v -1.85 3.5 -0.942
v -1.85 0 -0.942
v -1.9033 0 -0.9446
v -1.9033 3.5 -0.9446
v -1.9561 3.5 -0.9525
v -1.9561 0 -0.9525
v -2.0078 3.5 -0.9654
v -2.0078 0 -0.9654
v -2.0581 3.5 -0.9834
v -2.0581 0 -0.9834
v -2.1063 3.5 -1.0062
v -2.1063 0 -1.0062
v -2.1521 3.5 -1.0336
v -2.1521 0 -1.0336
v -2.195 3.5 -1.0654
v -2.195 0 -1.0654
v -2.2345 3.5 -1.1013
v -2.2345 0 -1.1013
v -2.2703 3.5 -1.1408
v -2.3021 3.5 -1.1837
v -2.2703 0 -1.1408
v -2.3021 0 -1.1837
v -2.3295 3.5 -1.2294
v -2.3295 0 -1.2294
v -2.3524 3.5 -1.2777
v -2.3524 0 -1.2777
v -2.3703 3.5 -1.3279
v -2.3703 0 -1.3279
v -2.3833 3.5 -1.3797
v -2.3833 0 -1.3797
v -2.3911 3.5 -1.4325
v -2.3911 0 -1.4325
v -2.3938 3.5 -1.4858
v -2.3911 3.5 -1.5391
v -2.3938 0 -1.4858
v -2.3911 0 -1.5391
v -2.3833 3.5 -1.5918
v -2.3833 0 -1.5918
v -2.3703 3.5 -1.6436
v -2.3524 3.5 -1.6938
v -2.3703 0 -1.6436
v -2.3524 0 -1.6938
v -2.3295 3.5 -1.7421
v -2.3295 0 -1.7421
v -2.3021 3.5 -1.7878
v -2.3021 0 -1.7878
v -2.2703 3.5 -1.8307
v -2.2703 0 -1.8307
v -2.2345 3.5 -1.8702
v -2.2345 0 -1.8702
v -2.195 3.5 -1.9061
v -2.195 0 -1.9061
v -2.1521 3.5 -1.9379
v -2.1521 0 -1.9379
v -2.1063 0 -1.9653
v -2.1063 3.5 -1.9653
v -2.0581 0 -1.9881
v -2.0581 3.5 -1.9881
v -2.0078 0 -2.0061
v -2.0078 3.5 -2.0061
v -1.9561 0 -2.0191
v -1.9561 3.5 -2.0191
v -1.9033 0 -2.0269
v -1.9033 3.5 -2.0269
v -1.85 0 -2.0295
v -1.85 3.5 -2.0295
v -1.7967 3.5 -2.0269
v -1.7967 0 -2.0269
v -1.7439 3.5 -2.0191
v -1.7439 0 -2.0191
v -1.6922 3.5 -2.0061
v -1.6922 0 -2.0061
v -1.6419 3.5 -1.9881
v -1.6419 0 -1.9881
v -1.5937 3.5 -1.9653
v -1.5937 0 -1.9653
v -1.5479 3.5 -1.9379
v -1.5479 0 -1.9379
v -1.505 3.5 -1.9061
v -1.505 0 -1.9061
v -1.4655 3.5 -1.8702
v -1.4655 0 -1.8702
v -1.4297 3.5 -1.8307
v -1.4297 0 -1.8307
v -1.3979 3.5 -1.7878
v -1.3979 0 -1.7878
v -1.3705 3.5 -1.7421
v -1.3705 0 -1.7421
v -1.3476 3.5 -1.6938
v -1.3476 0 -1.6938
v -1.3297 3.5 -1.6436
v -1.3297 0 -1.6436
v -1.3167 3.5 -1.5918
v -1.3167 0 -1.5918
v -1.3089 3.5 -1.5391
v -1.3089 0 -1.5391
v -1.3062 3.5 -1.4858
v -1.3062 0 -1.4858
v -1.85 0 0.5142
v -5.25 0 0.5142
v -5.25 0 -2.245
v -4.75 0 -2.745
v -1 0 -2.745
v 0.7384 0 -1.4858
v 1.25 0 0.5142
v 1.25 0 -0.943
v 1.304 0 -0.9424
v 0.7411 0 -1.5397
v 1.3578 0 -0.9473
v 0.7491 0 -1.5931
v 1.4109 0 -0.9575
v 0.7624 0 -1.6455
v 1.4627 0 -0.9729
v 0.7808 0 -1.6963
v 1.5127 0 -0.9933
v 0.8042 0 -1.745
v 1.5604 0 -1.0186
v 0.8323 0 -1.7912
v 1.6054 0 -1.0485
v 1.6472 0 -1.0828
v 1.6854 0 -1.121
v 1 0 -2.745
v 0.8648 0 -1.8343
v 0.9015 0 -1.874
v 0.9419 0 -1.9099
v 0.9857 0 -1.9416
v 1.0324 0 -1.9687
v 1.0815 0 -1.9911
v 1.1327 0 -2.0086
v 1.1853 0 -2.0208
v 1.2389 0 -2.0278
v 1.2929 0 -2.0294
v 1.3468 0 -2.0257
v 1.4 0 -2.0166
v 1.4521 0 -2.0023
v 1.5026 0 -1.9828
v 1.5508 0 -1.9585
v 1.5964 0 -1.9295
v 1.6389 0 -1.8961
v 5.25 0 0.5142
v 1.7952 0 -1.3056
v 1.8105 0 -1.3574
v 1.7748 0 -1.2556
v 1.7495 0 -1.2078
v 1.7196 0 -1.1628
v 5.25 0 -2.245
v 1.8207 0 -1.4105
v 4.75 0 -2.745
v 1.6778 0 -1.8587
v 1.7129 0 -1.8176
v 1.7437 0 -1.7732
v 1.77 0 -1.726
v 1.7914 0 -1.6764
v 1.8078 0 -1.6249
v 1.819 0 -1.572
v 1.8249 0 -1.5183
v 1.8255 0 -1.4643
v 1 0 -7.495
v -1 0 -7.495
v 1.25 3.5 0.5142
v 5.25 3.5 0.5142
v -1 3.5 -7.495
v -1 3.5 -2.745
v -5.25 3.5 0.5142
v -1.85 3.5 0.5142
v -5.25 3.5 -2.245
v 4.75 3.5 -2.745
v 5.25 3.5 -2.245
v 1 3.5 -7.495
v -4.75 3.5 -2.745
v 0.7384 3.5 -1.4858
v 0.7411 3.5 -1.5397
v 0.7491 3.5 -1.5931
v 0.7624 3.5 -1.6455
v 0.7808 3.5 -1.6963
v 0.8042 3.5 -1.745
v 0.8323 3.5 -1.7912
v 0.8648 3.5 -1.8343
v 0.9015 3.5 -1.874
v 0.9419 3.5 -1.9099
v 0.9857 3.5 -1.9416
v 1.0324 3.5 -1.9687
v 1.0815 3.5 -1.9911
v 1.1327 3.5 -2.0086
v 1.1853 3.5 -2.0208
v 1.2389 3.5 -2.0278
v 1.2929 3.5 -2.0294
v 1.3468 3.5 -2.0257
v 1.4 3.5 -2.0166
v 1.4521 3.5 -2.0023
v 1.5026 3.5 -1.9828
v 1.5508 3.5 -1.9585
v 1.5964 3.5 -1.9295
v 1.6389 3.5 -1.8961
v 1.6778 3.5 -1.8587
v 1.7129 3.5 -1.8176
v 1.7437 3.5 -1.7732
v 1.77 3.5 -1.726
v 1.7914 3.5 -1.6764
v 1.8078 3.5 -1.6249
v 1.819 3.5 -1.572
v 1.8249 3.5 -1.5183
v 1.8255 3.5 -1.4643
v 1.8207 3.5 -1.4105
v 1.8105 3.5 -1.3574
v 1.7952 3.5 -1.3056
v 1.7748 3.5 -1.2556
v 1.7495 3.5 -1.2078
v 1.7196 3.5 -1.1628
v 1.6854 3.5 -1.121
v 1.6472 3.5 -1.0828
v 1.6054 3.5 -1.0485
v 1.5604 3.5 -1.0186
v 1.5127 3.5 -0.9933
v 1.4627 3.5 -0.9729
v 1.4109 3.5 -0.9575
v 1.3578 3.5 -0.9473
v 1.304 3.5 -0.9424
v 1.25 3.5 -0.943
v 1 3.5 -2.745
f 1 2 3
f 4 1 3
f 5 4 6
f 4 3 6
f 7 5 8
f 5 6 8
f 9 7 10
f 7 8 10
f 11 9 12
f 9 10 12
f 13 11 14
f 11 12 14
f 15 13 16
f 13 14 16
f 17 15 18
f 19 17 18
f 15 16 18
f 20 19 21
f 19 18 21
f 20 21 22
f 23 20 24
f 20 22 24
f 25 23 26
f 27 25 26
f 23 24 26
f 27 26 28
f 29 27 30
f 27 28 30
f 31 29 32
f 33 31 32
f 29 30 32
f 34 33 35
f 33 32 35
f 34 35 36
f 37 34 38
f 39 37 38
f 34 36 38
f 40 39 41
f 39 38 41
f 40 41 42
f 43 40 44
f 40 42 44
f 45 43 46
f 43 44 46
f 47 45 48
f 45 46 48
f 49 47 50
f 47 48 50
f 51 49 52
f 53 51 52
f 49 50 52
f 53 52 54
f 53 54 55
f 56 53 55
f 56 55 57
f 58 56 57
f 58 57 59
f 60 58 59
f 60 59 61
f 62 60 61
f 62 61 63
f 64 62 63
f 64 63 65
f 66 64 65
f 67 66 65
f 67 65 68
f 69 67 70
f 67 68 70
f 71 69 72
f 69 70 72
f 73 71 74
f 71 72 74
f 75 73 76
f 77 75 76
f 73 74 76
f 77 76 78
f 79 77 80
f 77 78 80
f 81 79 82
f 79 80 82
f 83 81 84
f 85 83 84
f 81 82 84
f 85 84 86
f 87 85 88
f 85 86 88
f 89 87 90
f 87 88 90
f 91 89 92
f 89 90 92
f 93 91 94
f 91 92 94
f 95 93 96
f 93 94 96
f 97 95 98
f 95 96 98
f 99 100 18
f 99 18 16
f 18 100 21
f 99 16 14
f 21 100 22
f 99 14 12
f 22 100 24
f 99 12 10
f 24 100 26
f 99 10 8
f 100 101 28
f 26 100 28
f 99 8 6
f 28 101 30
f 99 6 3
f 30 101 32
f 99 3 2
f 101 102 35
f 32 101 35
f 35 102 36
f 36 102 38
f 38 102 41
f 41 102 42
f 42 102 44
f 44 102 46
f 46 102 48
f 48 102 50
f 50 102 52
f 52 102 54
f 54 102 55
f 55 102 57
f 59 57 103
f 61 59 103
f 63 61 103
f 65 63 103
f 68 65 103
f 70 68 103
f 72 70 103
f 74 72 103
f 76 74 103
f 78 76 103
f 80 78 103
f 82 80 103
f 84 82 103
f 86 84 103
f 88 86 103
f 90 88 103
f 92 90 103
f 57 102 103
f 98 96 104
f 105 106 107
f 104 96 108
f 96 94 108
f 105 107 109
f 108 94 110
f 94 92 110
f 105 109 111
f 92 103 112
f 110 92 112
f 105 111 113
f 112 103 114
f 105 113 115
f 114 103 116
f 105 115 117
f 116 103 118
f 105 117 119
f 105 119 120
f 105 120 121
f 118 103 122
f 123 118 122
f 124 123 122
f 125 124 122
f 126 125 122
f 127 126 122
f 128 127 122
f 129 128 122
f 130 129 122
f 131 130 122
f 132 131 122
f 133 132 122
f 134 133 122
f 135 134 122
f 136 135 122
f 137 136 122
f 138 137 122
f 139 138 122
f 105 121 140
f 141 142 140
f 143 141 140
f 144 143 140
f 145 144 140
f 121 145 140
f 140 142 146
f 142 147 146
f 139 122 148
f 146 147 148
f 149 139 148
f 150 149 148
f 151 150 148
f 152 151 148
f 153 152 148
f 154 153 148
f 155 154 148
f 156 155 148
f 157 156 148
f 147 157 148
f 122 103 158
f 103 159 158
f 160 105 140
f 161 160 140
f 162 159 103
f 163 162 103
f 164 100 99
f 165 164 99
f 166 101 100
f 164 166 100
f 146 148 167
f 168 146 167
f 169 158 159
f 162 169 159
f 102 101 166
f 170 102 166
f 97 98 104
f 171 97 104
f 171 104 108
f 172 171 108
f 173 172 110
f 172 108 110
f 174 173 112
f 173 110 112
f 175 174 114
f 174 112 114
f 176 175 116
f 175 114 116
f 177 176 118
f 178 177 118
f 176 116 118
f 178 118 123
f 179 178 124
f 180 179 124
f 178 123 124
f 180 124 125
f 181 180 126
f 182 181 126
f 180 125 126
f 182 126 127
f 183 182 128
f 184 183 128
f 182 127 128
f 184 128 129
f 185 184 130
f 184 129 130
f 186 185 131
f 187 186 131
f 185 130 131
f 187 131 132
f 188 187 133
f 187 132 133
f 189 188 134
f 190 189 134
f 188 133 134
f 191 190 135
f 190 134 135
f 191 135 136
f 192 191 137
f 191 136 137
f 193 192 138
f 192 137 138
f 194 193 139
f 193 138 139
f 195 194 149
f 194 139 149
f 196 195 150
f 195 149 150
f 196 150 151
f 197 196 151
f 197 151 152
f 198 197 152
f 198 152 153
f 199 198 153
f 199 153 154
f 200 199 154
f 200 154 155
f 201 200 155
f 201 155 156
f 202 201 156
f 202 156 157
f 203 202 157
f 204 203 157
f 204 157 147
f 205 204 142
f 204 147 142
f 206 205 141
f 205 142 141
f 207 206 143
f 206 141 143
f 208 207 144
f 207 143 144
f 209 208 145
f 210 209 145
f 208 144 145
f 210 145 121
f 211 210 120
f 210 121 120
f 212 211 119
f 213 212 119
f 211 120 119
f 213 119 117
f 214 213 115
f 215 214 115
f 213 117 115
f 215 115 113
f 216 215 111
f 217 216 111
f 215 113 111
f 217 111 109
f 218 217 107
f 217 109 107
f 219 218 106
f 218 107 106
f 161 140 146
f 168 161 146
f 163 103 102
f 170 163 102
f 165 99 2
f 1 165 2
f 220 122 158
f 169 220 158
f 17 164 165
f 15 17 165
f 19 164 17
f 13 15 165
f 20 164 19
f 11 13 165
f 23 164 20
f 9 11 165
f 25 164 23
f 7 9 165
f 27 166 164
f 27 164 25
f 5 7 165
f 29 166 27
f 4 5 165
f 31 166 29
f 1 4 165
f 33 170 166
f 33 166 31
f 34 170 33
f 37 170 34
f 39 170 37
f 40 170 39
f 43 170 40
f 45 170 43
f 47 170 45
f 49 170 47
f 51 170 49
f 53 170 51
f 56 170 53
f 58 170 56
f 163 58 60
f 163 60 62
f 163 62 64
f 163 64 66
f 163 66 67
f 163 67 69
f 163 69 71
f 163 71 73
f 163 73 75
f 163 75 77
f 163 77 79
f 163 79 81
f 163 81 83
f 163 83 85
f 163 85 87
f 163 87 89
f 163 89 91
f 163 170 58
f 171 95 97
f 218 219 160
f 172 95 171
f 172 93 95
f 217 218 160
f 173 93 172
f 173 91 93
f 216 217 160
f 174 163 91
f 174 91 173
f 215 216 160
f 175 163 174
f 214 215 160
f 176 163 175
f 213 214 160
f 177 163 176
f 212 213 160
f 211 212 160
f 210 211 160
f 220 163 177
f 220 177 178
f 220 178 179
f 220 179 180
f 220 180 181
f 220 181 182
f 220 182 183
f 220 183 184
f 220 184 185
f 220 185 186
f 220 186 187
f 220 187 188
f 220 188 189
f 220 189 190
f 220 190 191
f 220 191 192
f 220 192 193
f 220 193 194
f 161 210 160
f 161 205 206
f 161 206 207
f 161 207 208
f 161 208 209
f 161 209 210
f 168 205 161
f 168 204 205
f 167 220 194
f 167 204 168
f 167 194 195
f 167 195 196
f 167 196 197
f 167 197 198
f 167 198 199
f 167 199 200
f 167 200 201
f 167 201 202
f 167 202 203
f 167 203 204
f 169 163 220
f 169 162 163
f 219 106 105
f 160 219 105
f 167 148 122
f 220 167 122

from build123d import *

# Parameters (mm, degrees)
BOSS_EXTRUDE1_DEPTH = 3.5
CHAMFER1_SIZE       = 0.5


with BuildPart() as part:
    # Sketch1 → Boss-Extrude1 (new body)
    with BuildSketch(Plane(origin=(0, 0, 0), x_dir=(1, 0, 0), z_dir=(0, 1, 0))):
        with BuildLine():
            Line((-5.25, -0.51424544), (-1.85, -0.51424544))
            Line((-1.85, -0.51424544), (-1.85, 0.942004129))
            ThreePointArc((-1.85, 0.942004129), (-2.234489618, 1.870244178), (-1.306249568, 1.48575456))
            Line((-1.306249568, 1.48575456), (0.738401898, 1.48575456))
            ThreePointArc((0.738401898, 1.48575456), (1.677846262, 1.85870341), (1.25, 0.942955555))
            Line((1.25, 0.942955555), (1.25, -0.51424544))
            Line((1.25, -0.51424544), (5.25, -0.51424544))
            Line((5.25, -0.51424544), (5.25, 2.74500456))
            Line((5.25, 2.74500456), (1, 2.74500456))
            Line((1, 2.74500456), (1, 7.49500456))
            Line((1, 7.49500456), (-1, 7.49500456))
            Line((-1, 7.49500456), (-1, 2.74500456))
            Line((-1, 2.74500456), (-5.25, 2.74500456))
            Line((-5.25, 2.74500456), (-5.25, -0.51424544))
        make_face()
    extrude(amount=BOSS_EXTRUDE1_DEPTH)

    # Chamfer1
    chamfer1_edges = [part.edges().sort_by_distance(p)[0] for p in [
        (5.25, 1.75, -2.74500456),
        (-5.25, 1.75, -2.74500456),
    ]]
    chamfer(chamfer1_edges, length=CHAMFER1_SIZE)


solid = part.part
